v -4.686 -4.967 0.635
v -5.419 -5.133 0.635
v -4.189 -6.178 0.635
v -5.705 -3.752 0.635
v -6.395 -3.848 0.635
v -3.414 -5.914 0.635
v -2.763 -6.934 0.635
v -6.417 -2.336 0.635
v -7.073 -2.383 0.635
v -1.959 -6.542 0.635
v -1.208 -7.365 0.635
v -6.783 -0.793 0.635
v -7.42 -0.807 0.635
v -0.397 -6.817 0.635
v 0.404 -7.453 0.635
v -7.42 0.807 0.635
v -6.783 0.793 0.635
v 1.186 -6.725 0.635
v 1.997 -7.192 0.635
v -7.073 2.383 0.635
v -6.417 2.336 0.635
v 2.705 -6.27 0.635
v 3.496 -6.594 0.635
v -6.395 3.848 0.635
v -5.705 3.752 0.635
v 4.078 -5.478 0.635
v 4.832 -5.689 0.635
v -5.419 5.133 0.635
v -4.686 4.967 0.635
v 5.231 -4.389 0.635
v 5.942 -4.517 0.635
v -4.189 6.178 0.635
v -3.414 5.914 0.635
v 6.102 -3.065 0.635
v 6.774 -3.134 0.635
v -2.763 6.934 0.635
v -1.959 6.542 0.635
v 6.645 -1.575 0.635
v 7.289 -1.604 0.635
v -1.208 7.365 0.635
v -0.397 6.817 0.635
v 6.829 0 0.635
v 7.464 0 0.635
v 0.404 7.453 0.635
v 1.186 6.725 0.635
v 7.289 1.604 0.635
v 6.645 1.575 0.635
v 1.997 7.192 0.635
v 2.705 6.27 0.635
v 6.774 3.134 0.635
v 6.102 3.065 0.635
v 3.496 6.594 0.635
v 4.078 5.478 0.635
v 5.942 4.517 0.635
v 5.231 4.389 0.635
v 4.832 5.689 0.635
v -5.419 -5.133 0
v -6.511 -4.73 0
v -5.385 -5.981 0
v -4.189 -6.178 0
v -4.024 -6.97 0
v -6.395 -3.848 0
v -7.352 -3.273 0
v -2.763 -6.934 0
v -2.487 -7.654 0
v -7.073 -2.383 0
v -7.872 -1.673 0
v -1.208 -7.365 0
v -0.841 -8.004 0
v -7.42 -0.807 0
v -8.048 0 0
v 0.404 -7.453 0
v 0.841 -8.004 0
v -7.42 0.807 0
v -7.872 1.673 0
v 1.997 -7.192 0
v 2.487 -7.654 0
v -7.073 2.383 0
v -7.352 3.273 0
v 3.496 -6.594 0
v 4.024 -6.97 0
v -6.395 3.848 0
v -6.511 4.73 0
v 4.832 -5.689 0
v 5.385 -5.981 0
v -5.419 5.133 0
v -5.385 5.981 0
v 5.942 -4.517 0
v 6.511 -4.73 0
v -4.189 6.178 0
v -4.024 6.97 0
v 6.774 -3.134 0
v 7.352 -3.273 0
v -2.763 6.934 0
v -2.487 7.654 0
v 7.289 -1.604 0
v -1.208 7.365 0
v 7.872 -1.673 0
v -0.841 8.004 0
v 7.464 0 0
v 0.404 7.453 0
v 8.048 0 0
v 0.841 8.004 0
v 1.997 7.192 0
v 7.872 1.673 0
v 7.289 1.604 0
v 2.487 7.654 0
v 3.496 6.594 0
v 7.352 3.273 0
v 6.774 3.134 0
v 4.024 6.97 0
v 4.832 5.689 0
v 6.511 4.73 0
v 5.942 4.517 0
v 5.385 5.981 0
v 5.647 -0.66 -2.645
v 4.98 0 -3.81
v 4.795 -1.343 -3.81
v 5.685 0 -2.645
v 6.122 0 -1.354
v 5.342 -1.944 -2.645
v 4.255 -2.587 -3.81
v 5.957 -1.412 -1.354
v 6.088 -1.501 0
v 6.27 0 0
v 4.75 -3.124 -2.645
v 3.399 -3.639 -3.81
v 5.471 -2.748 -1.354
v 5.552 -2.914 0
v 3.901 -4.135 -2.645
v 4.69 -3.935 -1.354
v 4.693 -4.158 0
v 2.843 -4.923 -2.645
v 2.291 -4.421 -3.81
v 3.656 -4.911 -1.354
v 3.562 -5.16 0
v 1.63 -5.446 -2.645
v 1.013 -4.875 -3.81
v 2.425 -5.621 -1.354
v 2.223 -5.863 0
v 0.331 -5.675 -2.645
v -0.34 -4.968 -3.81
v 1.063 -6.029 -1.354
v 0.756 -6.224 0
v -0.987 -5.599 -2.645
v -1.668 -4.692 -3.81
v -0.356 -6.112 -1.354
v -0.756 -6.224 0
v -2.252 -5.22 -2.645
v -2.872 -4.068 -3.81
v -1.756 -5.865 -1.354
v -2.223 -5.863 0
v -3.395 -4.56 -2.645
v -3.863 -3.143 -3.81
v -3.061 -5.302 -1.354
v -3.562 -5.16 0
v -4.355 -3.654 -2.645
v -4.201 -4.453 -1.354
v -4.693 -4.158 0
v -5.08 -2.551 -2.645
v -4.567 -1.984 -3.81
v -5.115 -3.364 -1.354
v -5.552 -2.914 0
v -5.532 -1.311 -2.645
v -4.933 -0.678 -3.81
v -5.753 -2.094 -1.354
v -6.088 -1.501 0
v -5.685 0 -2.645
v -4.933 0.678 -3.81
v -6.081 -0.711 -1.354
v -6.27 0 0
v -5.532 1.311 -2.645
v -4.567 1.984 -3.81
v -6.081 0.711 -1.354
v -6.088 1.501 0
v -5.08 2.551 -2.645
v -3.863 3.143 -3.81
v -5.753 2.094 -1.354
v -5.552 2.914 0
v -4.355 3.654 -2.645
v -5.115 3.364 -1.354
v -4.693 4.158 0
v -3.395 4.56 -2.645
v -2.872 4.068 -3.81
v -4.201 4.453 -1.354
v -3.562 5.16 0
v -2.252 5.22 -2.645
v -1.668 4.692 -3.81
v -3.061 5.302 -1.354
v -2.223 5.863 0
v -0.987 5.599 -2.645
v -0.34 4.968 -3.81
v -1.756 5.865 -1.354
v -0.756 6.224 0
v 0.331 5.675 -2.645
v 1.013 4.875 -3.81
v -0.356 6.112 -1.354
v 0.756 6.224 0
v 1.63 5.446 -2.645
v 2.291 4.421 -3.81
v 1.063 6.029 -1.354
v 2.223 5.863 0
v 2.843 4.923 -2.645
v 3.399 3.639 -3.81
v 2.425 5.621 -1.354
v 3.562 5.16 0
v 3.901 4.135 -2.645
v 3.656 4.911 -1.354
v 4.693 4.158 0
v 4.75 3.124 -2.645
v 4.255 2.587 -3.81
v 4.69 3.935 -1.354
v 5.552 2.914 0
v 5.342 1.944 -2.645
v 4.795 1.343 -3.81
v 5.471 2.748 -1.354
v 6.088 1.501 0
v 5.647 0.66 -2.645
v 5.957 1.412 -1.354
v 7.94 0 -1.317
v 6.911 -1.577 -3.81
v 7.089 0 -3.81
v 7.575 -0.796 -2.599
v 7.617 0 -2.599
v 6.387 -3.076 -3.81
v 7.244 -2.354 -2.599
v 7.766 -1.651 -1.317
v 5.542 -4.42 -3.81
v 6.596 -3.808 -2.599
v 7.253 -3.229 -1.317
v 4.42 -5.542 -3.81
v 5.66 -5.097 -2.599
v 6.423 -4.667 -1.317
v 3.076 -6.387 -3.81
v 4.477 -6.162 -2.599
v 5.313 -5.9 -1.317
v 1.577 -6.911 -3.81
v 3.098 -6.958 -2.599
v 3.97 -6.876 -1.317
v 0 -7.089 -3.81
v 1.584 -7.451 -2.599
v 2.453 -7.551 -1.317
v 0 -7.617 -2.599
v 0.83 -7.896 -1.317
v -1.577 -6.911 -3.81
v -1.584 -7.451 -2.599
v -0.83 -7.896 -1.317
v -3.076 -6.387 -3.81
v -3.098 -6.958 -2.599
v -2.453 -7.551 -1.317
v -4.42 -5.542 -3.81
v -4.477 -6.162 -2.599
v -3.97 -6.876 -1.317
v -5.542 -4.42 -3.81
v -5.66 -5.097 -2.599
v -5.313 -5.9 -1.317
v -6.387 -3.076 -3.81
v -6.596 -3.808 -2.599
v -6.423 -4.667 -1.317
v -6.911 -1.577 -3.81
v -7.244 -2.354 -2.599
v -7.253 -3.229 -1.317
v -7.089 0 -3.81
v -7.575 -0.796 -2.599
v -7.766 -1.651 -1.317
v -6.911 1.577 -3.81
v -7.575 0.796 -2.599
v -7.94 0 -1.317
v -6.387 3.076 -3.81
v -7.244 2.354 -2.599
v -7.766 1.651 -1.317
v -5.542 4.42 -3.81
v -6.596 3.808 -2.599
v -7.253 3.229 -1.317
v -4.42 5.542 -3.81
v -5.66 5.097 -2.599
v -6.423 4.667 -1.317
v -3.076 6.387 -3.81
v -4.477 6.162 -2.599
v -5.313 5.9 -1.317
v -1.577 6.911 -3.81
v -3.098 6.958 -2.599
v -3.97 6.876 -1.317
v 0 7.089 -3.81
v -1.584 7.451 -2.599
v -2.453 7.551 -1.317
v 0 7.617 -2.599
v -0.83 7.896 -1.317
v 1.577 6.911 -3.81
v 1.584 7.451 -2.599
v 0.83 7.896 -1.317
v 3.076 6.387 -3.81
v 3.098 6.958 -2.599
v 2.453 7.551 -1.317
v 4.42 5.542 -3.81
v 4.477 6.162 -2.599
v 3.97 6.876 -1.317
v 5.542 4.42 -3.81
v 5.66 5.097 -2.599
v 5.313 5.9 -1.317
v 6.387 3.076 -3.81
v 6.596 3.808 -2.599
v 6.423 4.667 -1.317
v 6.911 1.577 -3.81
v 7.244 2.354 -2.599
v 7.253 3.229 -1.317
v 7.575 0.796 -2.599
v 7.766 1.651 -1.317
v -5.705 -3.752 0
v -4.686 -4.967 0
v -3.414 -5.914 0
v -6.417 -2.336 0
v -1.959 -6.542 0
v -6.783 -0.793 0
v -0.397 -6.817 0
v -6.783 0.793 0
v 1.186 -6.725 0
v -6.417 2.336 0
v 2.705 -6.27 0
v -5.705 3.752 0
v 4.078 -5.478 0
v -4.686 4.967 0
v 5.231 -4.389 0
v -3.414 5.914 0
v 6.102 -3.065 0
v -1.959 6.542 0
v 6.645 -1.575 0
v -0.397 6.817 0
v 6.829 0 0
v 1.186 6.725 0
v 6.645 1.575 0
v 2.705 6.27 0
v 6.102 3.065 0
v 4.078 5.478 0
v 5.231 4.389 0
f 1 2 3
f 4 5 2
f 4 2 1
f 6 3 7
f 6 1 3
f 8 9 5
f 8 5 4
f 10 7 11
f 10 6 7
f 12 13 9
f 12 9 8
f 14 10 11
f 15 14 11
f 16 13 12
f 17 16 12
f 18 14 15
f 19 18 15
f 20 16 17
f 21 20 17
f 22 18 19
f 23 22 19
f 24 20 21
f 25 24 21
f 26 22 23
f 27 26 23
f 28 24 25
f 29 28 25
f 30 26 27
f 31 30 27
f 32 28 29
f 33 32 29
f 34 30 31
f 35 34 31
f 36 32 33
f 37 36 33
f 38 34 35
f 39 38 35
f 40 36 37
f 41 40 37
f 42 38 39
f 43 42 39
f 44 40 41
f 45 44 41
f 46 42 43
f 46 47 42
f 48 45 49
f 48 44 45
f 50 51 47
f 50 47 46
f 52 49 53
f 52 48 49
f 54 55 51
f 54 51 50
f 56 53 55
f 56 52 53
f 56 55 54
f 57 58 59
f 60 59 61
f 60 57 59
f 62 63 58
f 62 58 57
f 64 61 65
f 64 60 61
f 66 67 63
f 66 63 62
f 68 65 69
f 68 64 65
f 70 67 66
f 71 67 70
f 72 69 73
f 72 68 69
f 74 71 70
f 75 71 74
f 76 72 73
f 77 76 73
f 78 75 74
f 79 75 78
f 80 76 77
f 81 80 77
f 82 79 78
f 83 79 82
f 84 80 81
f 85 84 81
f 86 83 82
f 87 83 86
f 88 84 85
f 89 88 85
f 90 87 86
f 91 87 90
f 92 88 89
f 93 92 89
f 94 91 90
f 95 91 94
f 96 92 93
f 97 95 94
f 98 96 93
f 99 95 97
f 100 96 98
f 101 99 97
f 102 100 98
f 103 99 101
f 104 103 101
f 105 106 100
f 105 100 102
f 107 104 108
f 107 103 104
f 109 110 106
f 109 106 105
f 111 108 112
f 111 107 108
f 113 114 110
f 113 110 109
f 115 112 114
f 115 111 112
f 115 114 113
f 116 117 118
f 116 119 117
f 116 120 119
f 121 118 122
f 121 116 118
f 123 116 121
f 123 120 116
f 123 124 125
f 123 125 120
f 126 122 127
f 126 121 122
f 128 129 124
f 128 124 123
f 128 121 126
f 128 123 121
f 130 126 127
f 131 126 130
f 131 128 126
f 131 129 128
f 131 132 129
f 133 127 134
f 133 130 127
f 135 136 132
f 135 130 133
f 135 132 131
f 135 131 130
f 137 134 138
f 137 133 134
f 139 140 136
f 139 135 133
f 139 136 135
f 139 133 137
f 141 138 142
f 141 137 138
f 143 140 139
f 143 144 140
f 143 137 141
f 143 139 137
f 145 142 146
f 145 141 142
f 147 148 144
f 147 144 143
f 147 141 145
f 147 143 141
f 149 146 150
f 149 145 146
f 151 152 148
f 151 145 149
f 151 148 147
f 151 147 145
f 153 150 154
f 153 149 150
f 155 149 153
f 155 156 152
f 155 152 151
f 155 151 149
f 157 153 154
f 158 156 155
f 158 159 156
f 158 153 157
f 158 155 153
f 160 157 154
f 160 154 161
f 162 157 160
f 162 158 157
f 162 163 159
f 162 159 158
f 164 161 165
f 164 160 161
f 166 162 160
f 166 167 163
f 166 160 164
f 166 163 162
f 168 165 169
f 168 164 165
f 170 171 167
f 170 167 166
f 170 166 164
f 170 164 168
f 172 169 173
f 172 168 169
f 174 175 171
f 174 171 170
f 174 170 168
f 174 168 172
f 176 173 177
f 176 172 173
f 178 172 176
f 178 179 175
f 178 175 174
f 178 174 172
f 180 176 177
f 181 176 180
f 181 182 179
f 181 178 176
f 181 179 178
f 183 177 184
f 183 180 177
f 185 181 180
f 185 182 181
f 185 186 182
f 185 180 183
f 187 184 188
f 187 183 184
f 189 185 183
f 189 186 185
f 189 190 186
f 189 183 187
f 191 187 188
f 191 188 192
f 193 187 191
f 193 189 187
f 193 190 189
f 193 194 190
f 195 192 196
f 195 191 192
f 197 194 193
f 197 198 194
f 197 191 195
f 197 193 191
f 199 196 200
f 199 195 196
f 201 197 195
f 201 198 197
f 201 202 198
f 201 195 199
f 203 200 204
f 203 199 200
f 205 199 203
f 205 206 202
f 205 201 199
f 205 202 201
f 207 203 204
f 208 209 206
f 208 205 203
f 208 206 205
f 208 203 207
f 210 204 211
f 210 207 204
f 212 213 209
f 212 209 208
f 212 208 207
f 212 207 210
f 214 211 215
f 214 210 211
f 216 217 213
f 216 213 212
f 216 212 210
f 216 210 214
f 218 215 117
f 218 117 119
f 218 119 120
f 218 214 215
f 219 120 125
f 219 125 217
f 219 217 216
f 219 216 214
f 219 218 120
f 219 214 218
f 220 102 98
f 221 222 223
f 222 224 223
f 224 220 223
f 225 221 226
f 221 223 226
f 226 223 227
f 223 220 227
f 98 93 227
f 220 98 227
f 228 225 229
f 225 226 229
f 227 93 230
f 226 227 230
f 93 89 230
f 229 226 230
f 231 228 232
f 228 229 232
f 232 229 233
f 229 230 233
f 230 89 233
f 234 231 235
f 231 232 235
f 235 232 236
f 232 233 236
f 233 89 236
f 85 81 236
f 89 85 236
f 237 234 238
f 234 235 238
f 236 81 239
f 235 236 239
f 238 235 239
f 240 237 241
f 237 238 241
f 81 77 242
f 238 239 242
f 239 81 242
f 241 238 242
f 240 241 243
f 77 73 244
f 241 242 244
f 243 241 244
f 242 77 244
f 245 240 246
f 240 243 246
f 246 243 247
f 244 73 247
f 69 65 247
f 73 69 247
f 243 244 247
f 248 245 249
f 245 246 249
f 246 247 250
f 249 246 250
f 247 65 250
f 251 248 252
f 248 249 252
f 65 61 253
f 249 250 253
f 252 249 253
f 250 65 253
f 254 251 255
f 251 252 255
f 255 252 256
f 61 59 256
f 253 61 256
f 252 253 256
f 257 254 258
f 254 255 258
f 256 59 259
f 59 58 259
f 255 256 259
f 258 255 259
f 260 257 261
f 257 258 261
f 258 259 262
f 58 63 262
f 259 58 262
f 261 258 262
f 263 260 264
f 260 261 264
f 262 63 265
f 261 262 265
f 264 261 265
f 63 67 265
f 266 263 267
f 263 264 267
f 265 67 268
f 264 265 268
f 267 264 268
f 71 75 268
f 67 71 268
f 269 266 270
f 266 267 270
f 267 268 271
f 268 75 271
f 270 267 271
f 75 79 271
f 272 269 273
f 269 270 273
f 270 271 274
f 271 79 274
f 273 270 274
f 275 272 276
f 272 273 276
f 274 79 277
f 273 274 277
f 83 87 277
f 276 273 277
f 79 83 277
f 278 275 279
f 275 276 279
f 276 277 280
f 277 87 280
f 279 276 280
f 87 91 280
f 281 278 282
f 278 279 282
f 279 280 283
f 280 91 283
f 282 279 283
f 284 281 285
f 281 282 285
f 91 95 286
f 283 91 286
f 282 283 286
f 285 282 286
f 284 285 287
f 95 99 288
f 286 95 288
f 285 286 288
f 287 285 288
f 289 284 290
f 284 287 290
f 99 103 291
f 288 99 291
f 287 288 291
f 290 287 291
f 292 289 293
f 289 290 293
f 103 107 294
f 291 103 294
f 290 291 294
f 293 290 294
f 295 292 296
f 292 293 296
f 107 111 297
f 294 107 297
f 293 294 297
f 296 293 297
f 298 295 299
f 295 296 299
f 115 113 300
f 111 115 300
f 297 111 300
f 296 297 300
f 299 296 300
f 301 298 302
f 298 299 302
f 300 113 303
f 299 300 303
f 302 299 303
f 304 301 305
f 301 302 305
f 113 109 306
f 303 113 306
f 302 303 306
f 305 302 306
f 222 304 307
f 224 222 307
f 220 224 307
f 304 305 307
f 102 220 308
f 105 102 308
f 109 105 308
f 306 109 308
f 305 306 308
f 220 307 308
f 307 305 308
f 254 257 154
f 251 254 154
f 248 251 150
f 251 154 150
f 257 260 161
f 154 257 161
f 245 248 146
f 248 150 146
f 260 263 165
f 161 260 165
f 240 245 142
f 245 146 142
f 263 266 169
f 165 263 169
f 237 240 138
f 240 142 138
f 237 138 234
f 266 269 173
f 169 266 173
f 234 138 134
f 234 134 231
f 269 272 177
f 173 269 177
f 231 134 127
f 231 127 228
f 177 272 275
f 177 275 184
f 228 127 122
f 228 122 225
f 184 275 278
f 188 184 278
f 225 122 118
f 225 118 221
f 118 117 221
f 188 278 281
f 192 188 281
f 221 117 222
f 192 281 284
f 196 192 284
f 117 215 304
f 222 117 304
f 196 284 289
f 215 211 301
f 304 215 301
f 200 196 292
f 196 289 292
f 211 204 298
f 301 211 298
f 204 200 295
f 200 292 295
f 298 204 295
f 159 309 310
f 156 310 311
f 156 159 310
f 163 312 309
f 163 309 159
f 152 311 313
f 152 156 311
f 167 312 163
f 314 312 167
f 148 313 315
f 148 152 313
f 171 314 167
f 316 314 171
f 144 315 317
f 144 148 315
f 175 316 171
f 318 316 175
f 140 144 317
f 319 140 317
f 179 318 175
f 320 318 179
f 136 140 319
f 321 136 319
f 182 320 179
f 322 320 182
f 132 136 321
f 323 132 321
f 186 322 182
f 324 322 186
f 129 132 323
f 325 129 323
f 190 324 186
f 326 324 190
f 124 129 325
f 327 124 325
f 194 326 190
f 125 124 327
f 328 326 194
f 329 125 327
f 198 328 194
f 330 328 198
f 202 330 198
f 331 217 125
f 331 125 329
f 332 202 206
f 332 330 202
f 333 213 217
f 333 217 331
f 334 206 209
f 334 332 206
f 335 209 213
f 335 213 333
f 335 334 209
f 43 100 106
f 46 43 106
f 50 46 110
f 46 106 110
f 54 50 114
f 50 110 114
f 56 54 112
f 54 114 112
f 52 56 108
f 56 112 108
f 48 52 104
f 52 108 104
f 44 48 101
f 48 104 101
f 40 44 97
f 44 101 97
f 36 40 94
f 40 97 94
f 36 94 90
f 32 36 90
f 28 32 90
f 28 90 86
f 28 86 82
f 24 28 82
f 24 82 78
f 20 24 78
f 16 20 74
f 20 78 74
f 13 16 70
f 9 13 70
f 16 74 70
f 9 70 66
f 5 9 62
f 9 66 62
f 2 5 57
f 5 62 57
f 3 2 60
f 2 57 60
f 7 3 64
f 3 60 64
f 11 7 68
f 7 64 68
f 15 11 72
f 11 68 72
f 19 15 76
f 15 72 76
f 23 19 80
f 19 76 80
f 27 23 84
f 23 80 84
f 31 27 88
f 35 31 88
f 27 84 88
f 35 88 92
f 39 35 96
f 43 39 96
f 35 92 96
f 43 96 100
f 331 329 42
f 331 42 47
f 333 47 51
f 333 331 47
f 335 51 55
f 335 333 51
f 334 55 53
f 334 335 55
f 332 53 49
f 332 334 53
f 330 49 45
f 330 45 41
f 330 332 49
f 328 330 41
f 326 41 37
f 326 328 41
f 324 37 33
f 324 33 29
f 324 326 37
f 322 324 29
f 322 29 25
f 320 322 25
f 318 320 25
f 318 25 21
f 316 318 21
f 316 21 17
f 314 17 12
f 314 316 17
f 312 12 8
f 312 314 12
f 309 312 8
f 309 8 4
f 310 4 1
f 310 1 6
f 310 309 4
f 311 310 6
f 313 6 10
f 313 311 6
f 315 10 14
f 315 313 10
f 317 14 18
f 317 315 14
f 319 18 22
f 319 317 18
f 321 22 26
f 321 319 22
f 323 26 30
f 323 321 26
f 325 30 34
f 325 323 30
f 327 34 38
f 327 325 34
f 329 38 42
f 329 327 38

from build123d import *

# Parameters (mm, degrees)
F4_R      = 12.7
F5_DEPTH  = 25.4
F7_R      = 12.7
F8_DEPTH  = 25.4
F9_R      = 7.463803
F9_R_2    = 6.828803
F10_DEPTH = 0.635


with BuildPart() as f1:
    # F0 (on Front) → F1 (revolve)
    with BuildSketch(Plane.XZ):
        with BuildLine():
            ThreePointArc((0, -8.048003), (8.048003, 0), (0, 8.048003))
            Line((0, 8.048003), (0, -8.048003))
        make_face()
    revolve(axis=Axis((0, 0, 0), (0, 0, -1)))

    # F2 (on Front) → F3 (revolve, cut)
    with BuildSketch(Plane.XZ):
        with BuildLine():
            ThreePointArc((0, -6.270003), (6.270003, 0), (0, 6.270003))
            Line((0, 6.270003), (0, -6.270003))
        make_face()
    revolve(axis=Axis((0, 0, 0), (0, 0, -1)), mode=Mode.SUBTRACT)

    # F4 (on Top) → F5 (cut)
    with BuildSketch(Plane.XY):
        Circle(F4_R)
    extrude(amount=F5_DEPTH, mode=Mode.SUBTRACT)

    # F7 (on offset) → F8 (cut)
    with BuildSketch(Plane.XY.offset(-3.81)):
        Circle(F7_R)
    extrude(amount=-F8_DEPTH, mode=Mode.SUBTRACT)

    # F9 (on face) → F10 (join)
    with BuildSketch(Plane.XY):
        Circle(F9_R)
        Circle(F9_R_2, mode=Mode.SUBTRACT)
    extrude(amount=F10_DEPTH)


solid = f1.part
